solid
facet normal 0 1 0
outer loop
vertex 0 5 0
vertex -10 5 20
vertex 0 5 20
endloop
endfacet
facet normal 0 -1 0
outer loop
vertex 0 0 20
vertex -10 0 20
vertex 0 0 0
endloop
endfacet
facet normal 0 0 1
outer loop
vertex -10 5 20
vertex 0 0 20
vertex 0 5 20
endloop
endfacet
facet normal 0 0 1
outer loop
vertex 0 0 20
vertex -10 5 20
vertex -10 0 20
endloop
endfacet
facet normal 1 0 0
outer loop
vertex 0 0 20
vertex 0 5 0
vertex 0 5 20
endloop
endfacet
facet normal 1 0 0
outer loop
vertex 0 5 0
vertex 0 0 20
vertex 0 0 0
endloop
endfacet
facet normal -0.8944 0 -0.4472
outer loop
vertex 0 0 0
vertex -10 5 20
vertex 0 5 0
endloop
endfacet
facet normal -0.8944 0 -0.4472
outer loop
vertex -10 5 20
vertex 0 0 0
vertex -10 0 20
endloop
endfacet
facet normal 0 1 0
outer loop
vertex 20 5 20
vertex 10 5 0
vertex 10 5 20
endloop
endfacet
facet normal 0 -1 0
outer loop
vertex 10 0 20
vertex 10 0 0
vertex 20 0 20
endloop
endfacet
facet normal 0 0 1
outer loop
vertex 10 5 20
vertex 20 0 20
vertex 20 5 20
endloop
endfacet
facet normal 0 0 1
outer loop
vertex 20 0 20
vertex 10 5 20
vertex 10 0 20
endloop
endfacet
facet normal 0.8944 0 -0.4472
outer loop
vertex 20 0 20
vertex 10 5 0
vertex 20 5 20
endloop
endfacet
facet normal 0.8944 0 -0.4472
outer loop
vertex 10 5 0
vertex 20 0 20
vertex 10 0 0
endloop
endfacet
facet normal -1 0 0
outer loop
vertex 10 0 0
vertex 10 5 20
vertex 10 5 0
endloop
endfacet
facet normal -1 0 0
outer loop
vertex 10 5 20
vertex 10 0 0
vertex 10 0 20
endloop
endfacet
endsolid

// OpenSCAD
use <../nscad-lib.scad>

color("orange")    dreieckN(x = 10, y = 5, z = 20);
color("steelblue") move(20) dreieckP(x = 10, y = 5, z = 20);
